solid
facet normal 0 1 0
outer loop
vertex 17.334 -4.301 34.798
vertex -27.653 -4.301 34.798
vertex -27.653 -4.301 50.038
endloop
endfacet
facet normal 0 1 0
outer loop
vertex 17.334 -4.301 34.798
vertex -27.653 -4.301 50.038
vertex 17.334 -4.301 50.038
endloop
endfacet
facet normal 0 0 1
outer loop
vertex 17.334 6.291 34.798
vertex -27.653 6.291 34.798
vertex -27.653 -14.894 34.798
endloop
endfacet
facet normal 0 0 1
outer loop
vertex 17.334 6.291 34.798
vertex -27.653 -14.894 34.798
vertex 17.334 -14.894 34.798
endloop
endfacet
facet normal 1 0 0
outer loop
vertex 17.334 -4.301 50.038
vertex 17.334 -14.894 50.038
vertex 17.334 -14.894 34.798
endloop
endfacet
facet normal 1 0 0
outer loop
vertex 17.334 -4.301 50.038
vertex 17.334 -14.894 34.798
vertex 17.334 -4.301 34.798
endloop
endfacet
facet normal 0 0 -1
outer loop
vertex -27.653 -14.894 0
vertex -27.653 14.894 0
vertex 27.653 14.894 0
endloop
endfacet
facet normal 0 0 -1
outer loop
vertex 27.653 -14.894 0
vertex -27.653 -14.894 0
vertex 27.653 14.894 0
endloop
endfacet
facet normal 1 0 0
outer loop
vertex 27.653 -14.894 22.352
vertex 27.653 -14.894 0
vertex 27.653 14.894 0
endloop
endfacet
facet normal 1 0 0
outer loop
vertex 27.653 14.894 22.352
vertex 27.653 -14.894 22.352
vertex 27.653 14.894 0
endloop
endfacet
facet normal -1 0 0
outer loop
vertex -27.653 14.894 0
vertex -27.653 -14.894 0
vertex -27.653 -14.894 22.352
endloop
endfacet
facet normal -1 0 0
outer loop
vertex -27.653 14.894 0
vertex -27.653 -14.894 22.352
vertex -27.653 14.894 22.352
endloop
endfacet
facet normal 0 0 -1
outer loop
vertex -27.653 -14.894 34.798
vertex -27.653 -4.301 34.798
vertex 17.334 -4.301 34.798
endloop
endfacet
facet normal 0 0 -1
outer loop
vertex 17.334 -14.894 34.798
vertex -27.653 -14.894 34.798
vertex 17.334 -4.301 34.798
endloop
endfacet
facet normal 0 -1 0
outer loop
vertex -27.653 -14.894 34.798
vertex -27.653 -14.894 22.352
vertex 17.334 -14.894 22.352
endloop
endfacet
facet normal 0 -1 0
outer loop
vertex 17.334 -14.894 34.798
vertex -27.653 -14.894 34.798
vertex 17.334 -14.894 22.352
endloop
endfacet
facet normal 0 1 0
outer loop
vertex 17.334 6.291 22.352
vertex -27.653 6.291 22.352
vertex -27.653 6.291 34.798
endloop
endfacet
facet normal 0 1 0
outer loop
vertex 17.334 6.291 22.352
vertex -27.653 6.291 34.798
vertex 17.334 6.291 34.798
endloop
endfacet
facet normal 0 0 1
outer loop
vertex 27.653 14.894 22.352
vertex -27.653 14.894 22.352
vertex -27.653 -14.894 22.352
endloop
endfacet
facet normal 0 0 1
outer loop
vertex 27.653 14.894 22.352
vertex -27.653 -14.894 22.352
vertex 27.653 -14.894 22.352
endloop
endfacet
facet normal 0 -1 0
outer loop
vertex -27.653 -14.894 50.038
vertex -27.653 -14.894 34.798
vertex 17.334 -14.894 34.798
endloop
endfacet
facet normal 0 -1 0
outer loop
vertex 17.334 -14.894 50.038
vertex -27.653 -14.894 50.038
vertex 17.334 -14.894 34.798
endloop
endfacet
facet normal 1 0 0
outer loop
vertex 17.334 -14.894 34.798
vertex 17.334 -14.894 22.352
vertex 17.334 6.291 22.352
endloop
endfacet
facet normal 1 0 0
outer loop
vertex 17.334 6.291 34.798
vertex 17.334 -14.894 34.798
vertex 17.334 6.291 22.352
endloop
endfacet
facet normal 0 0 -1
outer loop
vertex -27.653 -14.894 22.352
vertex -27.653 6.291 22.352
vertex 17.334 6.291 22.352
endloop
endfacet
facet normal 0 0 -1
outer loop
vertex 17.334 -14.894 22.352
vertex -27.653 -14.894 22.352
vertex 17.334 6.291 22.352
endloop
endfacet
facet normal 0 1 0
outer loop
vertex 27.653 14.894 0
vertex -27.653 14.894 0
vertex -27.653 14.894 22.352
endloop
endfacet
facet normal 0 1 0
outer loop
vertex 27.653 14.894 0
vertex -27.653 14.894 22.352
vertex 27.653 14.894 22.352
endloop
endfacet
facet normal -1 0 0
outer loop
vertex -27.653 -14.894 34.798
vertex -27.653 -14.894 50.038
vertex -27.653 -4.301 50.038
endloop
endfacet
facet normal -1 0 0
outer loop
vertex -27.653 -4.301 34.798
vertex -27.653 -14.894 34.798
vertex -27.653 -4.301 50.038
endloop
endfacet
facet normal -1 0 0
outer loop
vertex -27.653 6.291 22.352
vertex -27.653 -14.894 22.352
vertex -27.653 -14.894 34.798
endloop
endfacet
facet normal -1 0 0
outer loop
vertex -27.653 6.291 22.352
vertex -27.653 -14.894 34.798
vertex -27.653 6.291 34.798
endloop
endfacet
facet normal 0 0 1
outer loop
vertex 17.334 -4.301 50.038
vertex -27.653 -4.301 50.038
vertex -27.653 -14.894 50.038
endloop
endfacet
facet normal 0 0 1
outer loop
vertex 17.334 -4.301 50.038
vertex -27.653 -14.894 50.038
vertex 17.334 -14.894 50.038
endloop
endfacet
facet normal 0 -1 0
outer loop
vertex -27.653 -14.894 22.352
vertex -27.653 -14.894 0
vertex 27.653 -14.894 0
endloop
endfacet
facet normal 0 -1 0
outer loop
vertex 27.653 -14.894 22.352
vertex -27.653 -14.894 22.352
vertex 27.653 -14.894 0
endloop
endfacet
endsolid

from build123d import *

# Parameters (mm, degrees)
F0_W     = 55.305324
F0_H     = 29.787272
F1_DEPTH = 22.352
F2_W     = 44.987052
F2_H     = 21.184455
F3_DEPTH = 12.446
F4_W     = 44.987052
F4_H     = 10.592228
F5_DEPTH = 15.24


with BuildPart() as f1:
    # F0 (on Top) → F1 (new body)
    with BuildSketch(Plane.XY):
        Rectangle(F0_W, F0_H)
    extrude(amount=F1_DEPTH)


with BuildPart() as f3:
    # F2 (on face) → F3 (new body)
    with BuildSketch(Plane.XY.offset(22.352)):
        with Locations((-5.159136, -4.301408)):
            Rectangle(F2_W, F2_H)
    extrude(amount=F3_DEPTH)


with BuildPart() as f5:
    # F4 (on face) → F5 (new body)
    with BuildSketch(Plane.XY.offset(34.798)):
        with Locations((-5.159136, -9.597522)):
            Rectangle(F4_W, F4_H)
    extrude(amount=F5_DEPTH)


solid = Compound([f1.part, f3.part, f5.part])
